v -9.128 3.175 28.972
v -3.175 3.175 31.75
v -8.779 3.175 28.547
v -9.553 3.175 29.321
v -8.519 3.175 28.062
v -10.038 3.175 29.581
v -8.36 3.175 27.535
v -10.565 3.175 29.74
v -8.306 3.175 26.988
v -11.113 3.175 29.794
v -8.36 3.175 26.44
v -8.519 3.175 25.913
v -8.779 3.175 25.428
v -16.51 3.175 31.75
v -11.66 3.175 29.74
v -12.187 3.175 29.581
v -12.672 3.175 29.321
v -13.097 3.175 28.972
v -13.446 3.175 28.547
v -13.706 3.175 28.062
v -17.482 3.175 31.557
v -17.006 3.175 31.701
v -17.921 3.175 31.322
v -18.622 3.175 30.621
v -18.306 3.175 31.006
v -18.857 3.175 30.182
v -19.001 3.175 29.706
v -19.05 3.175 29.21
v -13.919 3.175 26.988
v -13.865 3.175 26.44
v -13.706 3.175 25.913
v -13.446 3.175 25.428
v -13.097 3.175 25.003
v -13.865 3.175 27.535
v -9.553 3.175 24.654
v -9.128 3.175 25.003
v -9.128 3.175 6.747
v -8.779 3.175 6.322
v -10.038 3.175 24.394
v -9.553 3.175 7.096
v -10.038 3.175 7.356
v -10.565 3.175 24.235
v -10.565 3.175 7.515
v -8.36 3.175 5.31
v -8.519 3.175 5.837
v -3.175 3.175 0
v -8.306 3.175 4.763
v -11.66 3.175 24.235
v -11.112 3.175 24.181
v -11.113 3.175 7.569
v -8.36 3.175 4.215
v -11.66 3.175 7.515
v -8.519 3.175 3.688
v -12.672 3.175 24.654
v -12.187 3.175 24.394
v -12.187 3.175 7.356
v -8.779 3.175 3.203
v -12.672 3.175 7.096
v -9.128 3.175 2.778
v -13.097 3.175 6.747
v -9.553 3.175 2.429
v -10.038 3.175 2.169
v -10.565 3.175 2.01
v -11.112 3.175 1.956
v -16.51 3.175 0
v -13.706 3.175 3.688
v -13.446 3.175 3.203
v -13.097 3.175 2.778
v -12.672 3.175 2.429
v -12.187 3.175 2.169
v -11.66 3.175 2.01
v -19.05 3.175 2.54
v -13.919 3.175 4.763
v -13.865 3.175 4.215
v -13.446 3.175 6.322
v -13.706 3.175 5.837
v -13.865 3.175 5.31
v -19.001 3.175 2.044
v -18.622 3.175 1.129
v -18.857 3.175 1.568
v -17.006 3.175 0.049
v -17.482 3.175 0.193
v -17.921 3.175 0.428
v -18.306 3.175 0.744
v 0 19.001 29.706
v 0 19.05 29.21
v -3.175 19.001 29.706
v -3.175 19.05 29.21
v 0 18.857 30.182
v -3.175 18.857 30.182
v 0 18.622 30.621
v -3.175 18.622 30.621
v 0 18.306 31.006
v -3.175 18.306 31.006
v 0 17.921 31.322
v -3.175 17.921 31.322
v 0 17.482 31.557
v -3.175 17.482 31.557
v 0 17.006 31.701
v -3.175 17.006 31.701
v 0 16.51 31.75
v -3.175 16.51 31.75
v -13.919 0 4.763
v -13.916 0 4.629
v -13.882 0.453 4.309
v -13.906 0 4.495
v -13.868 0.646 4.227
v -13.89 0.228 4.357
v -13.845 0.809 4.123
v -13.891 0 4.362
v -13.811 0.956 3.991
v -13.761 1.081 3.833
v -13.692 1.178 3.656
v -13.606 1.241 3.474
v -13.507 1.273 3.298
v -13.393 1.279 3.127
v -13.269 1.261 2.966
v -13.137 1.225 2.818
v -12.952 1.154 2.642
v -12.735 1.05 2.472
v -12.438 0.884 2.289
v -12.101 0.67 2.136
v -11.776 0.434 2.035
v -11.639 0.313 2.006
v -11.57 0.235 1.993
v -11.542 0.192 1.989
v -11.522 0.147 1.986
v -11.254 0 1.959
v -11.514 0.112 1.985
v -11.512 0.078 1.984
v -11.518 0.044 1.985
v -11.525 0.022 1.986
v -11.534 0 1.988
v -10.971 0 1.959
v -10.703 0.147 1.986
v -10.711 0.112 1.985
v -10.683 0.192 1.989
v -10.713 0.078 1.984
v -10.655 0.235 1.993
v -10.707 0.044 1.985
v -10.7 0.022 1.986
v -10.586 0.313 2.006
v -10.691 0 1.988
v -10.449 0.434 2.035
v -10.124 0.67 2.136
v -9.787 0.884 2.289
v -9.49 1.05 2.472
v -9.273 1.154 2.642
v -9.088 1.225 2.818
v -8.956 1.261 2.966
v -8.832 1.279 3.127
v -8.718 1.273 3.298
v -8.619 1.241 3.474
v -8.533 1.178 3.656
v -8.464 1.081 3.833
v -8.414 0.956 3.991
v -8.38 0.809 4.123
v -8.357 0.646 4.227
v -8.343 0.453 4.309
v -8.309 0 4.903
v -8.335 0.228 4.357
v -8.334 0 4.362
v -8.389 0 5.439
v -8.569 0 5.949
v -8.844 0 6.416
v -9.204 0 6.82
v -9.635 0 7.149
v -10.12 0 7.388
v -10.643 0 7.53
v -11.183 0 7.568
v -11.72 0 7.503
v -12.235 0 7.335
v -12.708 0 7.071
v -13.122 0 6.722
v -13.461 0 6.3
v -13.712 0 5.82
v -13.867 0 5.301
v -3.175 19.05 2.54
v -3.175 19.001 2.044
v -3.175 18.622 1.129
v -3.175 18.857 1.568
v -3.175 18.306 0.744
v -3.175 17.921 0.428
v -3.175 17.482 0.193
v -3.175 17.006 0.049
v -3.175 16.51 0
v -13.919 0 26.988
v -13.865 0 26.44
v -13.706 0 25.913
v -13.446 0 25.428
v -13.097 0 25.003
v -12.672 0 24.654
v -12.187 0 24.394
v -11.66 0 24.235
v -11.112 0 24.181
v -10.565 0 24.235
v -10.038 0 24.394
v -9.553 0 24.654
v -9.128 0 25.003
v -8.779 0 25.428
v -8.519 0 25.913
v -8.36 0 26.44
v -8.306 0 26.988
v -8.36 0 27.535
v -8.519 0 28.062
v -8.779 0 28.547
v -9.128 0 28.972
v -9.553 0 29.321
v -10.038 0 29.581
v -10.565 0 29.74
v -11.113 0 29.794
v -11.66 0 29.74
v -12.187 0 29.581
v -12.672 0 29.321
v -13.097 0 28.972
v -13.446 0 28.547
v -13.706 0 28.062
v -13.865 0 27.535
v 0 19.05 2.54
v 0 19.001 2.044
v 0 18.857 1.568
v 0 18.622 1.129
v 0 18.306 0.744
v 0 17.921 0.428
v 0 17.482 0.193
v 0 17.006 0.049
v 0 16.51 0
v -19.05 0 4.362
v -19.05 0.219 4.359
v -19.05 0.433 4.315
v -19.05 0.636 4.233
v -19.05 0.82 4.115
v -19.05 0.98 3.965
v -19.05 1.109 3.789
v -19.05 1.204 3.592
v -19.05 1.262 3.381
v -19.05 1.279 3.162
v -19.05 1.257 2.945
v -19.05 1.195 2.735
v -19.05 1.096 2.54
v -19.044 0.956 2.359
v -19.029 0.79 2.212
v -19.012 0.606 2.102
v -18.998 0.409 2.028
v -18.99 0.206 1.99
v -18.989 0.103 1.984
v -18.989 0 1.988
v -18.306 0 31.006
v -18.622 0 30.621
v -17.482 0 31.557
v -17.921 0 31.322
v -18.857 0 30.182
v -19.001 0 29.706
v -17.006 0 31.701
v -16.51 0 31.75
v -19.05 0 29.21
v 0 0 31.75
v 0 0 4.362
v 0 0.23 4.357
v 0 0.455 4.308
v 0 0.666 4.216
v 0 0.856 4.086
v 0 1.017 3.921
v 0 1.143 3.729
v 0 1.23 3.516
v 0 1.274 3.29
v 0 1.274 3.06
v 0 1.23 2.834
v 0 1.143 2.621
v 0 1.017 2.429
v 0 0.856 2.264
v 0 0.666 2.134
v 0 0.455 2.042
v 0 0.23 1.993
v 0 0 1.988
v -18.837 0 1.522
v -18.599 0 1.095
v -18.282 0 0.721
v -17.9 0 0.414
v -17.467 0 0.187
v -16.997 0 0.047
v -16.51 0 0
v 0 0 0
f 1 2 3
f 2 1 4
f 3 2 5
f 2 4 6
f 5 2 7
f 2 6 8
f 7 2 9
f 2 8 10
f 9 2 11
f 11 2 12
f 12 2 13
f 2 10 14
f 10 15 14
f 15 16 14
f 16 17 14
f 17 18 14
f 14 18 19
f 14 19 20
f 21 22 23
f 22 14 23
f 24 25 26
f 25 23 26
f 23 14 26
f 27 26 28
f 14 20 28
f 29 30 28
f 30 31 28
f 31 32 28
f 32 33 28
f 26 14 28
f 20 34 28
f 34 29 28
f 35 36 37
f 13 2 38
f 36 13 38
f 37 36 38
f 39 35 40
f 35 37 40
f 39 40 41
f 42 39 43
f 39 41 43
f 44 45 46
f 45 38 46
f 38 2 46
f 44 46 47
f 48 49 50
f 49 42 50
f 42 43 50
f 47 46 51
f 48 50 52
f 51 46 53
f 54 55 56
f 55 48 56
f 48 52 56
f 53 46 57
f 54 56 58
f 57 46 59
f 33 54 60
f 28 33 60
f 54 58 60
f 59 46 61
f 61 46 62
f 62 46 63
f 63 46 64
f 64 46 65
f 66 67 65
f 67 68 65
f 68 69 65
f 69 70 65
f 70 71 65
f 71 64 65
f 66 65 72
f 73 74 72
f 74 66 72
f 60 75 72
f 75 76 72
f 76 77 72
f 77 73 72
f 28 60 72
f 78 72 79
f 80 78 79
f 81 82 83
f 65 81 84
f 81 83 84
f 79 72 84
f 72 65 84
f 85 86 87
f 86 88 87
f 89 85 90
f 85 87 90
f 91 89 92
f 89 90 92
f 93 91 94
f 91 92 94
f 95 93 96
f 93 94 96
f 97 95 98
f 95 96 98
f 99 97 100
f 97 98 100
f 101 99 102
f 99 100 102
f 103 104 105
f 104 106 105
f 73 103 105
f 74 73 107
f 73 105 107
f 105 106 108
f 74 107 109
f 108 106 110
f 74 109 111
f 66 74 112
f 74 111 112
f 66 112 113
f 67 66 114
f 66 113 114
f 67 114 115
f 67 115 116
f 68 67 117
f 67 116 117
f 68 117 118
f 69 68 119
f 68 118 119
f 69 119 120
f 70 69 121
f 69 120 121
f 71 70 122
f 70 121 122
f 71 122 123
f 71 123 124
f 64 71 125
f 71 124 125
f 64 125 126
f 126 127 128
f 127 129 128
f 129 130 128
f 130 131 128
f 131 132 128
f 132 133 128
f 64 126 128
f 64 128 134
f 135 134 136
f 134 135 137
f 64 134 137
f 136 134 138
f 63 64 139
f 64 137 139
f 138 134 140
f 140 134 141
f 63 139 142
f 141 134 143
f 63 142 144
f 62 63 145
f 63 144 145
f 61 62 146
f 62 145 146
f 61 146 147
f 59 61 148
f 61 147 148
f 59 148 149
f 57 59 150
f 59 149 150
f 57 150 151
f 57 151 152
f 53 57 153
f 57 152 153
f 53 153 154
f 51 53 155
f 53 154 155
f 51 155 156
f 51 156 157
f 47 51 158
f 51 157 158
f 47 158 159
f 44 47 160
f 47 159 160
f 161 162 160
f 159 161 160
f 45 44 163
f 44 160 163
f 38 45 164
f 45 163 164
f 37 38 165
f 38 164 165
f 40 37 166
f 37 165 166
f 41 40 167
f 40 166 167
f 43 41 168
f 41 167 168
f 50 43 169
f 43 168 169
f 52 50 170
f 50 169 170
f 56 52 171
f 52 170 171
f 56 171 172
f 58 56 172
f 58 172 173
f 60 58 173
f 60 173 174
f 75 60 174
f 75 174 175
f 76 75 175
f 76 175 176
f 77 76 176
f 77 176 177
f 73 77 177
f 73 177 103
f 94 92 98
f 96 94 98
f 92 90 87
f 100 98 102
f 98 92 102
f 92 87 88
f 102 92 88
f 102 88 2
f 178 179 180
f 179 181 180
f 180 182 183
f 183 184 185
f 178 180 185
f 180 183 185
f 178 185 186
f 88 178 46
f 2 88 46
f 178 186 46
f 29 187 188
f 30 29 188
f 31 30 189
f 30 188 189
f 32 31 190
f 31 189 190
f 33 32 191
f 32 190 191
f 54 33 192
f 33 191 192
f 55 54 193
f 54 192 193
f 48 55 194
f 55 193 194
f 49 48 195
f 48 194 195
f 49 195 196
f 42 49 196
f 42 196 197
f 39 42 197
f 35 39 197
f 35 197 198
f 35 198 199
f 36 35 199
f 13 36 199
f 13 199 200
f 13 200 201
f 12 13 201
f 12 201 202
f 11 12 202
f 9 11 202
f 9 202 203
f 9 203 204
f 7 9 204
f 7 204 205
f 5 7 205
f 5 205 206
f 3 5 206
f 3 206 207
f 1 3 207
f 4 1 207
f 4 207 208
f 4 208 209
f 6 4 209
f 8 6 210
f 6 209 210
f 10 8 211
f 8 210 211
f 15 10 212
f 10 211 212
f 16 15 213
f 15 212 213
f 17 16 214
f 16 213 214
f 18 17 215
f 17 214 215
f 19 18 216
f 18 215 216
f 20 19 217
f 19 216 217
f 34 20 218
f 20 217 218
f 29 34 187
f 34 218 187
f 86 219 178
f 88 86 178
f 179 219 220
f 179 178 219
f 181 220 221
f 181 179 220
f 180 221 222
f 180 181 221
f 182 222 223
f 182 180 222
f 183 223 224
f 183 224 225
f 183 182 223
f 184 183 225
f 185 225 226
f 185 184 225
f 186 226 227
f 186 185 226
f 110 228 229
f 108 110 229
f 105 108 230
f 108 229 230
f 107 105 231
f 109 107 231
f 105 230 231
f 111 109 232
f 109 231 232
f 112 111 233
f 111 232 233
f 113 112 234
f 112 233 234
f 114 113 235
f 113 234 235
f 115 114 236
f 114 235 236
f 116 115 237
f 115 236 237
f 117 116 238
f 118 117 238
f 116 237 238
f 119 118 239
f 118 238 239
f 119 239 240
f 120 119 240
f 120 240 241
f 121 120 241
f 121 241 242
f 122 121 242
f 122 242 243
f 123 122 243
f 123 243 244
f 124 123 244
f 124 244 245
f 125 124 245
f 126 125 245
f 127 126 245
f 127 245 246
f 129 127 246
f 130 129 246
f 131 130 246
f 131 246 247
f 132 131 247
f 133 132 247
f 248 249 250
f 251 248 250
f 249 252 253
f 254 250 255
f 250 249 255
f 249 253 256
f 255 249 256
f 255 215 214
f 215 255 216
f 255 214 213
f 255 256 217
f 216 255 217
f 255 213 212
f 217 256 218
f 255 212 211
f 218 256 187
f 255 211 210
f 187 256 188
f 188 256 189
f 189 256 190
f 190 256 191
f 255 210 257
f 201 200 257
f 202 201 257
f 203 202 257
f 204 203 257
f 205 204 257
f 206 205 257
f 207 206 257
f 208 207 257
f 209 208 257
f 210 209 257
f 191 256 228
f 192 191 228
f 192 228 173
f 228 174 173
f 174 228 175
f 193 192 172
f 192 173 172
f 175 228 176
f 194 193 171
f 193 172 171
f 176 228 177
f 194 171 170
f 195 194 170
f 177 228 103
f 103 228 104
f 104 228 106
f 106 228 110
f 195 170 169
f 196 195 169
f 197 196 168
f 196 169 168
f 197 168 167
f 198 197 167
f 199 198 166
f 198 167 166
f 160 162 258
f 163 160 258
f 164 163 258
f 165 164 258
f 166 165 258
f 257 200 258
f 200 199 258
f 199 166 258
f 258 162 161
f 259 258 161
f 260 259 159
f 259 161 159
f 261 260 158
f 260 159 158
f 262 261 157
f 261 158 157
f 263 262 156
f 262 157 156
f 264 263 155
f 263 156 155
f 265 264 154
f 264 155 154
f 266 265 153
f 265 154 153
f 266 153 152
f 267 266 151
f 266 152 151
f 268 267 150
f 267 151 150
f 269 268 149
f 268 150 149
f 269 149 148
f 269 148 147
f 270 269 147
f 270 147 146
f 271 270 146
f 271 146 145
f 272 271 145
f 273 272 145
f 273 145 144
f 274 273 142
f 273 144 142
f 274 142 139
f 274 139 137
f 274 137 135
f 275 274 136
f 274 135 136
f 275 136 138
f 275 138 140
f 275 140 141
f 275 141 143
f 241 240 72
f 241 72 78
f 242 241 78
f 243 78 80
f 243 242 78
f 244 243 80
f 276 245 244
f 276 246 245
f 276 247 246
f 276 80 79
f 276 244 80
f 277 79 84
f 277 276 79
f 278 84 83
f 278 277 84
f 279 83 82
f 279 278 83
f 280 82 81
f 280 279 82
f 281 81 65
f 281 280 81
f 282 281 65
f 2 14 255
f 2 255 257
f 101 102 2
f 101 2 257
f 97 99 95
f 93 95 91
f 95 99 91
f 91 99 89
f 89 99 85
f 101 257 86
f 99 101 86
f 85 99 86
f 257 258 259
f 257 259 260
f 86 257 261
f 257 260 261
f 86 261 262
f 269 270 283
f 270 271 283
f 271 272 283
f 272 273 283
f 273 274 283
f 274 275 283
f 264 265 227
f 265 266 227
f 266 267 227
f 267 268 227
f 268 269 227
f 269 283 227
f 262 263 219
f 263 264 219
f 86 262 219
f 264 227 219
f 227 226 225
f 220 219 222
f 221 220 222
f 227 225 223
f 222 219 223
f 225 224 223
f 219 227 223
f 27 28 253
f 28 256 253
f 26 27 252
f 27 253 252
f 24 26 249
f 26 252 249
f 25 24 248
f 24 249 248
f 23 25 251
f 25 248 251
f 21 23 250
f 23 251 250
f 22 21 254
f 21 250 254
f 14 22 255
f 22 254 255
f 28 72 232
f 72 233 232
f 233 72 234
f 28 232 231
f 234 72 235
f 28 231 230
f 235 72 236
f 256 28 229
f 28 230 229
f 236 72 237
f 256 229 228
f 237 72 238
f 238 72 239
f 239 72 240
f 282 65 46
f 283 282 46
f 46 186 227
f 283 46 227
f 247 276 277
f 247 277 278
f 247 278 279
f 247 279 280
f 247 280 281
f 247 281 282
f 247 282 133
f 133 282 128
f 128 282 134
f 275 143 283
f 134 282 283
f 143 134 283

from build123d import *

# Parameters (mm, degrees)
BOSS_EXTRUDE1_DEPTH                 = 31.75
F_3_32_0_09375_DIAMETER_HOLE1_D     = 2.38125
F_3_32_0_09375_DIAMETER_HOLE1_DEPTH = 25.4
F_3_32_0_09375_DIAMETER_HOLE1_TIP   = 0.715399675
F_10_CLEARANCE_HOLE1_D              = 5.6134
F_10_CLEARANCE_HOLE1_DEPTH          = 25.4
F_10_CLEARANCE_HOLE1_TIP            = 1.686435499
FILLET1_R                           = 2.54


with BuildPart() as part:
    # Sketch1 → Boss-Extrude1 (new body)
    with BuildSketch(Plane.XY):
        Polygon((0, 0), (0, 19.05), (-3.175, 19.05), (-3.175, 3.175), (-19.05, 3.175), (-19.05, 0), align=None)
    extrude(amount=BOSS_EXTRUDE1_DEPTH)

    # 3/32 (0.09375) Diameter Hole1
    with Locations(Plane(origin=(0, 0, 0), x_dir=(0, 0, -1), z_dir=(1, 0, 0))):
        with Locations((-3.175, 0.0889)):
            Hole(F_3_32_0_09375_DIAMETER_HOLE1_D / 2, depth=F_3_32_0_09375_DIAMETER_HOLE1_DEPTH)
            with Locations((0, 0, -(F_3_32_0_09375_DIAMETER_HOLE1_DEPTH + F_3_32_0_09375_DIAMETER_HOLE1_TIP / 2))):  # 118° drill point
                Cone(0, F_3_32_0_09375_DIAMETER_HOLE1_D / 2, F_3_32_0_09375_DIAMETER_HOLE1_TIP, mode=Mode.SUBTRACT)

    # #10 Clearance Hole1
    with Locations(Plane(origin=(0, 3.175, 0), x_dir=(1, 0, 0), z_dir=(0, 1, 0))):
        with Locations((-11.1125, -26.9875), (-11.1125, -4.7625)):
            Hole(F_10_CLEARANCE_HOLE1_D / 2, depth=F_10_CLEARANCE_HOLE1_DEPTH)
            with Locations((0, 0, -(F_10_CLEARANCE_HOLE1_DEPTH + F_10_CLEARANCE_HOLE1_TIP / 2))):  # 118° drill point
                Cone(0, F_10_CLEARANCE_HOLE1_D / 2, F_10_CLEARANCE_HOLE1_TIP, mode=Mode.SUBTRACT)

    # Fillet1
    fillet1_edges = [part.edges().sort_by_distance(p)[0] for p in [
        (-1.5875, 19.05, 31.75),
        (-19.05, 1.5875, 31.75),
        (-19.05, 1.5875, 0),
        (-1.5875, 19.05, 0),
    ]]
    fillet(fillet1_edges, radius=FILLET1_R)


solid = part.part
